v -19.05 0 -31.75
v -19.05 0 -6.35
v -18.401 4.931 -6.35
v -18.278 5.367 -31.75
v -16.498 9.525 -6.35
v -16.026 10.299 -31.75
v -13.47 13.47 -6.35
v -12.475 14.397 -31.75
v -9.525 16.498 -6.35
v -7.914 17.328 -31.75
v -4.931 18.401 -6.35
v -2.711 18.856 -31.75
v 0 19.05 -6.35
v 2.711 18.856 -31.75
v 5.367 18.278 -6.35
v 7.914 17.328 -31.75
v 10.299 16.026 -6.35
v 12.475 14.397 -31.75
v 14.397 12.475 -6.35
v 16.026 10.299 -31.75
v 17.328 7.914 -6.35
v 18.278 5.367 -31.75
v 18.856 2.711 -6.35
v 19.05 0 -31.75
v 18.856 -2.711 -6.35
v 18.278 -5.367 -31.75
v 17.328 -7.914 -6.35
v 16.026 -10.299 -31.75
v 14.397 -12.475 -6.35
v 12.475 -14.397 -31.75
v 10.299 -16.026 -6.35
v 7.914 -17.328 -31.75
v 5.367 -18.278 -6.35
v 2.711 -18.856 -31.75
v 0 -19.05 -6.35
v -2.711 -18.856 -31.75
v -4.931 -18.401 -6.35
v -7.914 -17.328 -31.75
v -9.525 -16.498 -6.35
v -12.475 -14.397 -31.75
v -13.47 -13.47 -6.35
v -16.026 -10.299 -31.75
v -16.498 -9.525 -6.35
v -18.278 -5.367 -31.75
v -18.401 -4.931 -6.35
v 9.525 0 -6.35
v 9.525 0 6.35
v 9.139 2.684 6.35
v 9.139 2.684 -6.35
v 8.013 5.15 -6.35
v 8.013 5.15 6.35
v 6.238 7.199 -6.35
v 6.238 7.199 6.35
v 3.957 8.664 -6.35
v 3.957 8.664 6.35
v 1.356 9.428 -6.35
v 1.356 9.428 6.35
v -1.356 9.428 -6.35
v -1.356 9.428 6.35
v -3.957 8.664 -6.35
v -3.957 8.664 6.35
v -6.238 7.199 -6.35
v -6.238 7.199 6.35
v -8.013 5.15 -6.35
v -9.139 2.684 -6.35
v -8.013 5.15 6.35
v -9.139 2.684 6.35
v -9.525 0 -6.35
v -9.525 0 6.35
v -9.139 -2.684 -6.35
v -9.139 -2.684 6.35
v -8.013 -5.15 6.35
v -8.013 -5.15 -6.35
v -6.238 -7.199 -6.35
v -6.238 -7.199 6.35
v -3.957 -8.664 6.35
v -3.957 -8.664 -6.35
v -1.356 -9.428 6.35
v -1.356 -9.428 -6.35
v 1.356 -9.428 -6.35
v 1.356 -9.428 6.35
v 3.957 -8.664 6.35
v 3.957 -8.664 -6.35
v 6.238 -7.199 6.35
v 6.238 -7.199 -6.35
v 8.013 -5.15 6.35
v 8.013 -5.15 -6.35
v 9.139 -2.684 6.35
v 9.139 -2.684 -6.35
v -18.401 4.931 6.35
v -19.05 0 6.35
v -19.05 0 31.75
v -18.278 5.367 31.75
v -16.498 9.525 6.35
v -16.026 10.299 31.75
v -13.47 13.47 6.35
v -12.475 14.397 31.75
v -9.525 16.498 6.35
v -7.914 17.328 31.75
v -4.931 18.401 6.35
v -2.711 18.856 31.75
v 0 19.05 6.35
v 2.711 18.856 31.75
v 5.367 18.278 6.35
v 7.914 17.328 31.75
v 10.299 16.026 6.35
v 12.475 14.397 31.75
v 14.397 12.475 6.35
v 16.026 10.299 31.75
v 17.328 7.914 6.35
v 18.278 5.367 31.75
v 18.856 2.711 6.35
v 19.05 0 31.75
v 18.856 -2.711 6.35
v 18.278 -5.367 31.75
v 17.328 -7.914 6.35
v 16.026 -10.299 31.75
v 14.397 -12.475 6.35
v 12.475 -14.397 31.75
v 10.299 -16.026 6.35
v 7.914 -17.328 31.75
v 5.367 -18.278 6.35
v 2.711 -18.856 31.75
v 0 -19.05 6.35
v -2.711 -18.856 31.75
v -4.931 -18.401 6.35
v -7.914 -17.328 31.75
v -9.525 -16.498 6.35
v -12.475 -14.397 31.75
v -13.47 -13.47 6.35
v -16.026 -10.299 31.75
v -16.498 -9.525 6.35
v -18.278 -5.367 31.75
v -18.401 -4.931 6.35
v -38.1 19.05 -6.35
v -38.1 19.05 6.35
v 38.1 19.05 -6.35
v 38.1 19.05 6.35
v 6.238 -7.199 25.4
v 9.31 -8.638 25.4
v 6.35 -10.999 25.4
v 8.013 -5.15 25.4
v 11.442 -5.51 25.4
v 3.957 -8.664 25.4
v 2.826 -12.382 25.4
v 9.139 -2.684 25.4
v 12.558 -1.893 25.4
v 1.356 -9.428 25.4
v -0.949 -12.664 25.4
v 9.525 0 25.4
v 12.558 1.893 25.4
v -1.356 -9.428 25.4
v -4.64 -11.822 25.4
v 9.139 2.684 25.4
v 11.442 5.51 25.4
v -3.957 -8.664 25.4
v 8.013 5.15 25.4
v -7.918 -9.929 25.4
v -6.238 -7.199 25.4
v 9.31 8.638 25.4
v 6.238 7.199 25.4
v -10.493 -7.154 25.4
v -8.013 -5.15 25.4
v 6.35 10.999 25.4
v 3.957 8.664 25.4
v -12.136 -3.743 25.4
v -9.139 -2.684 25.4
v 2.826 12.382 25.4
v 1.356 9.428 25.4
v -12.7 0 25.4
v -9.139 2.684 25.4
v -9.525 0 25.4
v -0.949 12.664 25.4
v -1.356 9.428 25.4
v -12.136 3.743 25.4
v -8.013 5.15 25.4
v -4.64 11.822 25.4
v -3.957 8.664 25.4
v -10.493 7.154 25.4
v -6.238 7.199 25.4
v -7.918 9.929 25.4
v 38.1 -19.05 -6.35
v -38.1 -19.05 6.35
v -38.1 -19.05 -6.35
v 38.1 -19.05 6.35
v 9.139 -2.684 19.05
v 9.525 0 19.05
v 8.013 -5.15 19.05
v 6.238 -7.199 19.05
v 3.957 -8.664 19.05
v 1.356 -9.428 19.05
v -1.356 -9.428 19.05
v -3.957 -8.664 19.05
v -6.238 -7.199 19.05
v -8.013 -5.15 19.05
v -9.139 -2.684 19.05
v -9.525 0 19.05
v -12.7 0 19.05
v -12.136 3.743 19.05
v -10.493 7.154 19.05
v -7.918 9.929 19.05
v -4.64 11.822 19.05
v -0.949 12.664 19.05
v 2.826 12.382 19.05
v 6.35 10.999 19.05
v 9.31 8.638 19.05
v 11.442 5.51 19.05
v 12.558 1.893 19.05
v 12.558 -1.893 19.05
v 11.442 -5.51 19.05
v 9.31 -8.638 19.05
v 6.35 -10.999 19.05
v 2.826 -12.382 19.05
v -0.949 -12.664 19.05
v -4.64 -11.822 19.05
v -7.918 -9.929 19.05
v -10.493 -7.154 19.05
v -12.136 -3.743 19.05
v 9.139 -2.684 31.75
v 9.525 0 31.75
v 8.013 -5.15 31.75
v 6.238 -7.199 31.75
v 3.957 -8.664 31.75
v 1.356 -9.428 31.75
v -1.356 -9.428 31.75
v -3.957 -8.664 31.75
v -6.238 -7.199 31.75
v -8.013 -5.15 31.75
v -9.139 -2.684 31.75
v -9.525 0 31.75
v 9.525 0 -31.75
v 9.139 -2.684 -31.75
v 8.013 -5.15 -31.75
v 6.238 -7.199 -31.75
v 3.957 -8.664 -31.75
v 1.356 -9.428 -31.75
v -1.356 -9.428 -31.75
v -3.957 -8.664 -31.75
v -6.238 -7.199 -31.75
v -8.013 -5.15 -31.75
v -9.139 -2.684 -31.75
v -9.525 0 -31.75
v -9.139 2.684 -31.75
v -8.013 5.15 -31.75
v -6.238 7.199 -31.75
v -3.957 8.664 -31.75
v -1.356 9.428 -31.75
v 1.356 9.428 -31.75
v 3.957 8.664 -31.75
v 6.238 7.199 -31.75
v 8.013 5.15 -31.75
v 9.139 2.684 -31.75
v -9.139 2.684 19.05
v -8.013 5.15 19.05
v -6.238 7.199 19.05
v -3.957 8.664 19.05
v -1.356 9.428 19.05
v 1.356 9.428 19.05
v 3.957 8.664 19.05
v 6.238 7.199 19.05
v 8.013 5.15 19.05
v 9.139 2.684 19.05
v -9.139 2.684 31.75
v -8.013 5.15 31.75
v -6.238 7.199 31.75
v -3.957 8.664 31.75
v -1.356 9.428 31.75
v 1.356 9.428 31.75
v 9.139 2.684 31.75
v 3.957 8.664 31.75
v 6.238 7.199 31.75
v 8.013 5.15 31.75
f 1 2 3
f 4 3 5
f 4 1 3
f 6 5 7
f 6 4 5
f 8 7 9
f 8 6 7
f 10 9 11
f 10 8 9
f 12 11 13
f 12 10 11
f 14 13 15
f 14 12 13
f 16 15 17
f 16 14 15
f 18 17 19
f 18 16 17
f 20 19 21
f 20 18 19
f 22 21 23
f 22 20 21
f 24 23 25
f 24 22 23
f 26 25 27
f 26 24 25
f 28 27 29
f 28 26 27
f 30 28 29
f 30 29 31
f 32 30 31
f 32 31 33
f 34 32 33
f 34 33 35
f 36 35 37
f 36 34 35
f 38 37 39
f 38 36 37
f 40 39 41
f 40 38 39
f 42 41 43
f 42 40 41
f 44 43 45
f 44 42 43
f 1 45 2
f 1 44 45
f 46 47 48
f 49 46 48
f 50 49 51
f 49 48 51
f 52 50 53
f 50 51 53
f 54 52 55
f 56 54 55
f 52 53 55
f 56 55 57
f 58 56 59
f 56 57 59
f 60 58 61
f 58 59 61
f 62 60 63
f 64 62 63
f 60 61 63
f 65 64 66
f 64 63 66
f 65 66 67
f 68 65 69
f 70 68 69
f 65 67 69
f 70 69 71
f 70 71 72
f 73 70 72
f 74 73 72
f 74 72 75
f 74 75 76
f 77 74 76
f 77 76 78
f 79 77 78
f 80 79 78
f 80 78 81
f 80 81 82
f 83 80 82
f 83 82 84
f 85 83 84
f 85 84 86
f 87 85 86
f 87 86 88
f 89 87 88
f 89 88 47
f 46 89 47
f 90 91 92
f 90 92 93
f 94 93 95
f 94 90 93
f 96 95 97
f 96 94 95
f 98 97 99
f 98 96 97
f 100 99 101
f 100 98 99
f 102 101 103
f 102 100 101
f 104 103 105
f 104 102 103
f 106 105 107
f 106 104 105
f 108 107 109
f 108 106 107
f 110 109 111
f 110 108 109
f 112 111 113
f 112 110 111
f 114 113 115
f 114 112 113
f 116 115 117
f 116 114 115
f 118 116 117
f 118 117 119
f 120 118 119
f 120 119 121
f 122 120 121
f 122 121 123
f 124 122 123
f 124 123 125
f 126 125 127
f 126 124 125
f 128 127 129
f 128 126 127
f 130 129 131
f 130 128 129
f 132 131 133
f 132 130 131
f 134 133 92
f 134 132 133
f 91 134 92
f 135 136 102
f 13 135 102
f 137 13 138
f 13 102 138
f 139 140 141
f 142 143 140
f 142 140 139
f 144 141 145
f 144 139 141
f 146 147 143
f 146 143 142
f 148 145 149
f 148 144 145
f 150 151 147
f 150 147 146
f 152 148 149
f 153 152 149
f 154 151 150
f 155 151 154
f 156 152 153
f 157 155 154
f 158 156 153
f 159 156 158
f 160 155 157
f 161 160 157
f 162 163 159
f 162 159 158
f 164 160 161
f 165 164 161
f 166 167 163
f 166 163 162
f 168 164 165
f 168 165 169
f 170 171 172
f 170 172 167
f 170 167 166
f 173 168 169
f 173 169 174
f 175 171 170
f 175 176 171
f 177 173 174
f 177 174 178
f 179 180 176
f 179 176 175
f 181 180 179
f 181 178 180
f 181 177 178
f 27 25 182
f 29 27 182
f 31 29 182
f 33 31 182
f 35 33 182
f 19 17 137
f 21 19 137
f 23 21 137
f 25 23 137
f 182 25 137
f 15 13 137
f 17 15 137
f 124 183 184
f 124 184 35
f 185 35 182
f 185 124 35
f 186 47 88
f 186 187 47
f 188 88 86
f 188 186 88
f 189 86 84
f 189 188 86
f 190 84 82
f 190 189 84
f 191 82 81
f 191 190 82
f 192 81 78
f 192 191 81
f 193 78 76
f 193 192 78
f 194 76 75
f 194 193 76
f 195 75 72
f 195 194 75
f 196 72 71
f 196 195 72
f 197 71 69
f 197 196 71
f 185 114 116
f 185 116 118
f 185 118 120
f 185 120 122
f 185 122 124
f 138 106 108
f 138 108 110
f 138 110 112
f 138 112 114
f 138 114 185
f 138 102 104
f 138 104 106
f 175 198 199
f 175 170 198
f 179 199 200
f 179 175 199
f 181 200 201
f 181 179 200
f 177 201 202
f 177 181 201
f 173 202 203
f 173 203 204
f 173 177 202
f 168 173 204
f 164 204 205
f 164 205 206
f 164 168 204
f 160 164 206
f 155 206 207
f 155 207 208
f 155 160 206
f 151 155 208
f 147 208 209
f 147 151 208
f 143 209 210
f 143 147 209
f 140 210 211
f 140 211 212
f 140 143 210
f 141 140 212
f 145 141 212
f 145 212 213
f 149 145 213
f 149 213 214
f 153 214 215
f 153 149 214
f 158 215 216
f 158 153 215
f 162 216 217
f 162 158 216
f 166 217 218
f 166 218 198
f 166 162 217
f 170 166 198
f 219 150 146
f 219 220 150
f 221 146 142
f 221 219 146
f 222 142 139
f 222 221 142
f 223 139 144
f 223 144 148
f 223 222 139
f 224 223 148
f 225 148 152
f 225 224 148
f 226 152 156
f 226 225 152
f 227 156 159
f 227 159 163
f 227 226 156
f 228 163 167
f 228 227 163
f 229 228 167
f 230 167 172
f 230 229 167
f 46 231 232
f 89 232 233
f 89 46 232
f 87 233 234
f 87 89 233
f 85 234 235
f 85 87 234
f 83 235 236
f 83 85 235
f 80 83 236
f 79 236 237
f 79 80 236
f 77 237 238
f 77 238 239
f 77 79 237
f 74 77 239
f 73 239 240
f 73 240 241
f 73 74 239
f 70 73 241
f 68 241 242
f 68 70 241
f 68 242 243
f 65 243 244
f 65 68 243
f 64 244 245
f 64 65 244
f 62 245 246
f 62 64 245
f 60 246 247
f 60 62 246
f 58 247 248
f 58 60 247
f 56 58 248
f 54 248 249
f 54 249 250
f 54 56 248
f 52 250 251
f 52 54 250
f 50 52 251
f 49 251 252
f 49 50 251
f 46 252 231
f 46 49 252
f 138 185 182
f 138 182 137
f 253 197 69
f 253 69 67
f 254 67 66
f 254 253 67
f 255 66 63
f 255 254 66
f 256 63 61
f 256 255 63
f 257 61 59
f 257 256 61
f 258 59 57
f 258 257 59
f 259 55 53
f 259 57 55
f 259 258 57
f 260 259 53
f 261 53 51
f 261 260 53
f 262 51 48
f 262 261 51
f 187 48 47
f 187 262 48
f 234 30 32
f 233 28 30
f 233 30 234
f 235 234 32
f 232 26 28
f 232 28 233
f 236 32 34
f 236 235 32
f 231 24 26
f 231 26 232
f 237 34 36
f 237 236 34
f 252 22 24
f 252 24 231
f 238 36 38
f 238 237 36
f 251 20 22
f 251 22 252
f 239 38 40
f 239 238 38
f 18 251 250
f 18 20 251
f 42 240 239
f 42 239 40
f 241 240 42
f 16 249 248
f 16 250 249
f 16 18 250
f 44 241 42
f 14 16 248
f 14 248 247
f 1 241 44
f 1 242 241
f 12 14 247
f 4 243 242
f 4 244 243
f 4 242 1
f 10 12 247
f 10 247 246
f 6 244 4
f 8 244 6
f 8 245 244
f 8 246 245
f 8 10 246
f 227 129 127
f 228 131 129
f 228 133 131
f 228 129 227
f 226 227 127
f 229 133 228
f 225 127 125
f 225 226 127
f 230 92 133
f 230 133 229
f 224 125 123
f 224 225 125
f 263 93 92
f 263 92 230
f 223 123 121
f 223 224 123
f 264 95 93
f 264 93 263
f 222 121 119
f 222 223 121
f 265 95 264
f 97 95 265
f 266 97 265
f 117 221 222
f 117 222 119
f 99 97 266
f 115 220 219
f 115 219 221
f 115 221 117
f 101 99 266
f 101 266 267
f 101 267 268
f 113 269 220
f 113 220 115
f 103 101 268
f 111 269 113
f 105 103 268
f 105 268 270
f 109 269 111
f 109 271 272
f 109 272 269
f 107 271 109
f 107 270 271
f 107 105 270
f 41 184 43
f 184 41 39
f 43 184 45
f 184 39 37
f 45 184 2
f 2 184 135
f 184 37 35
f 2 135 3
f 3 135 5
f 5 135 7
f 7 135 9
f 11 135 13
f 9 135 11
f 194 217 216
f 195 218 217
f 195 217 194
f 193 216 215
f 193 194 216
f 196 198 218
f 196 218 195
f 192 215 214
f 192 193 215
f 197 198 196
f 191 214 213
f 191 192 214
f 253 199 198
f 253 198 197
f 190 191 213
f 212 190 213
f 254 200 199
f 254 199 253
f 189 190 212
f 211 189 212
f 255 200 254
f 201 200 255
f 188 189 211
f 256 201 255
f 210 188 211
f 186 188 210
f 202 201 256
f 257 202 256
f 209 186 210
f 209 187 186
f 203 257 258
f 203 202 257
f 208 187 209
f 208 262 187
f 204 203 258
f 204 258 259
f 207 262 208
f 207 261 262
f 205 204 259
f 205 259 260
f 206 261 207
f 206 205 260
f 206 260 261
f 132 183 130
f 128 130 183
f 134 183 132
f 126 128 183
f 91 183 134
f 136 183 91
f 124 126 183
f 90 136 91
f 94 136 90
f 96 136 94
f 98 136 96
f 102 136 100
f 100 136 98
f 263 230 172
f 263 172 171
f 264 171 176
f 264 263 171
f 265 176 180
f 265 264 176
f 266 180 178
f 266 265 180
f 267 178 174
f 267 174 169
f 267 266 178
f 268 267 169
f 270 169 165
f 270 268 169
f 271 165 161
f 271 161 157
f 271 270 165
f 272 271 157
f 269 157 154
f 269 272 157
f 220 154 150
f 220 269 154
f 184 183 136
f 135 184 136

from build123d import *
from build123d import SkipClean  # not in build123d's __all__

# Parameters (mm, degrees)
F2_W     = 76.2
F2_H     = 38.1
F3_DEPTH = 6.35
F4_R     = 9.525
F5_DEPTH = 63.501


with BuildPart() as f1:
    # F0 (on Front) → F1 (revolve)
    with BuildSketch(Plane.XZ):
        Polygon((-9.525, 25.4), (-9.525, 31.75), (-19.05, 31.75), (-19.05, -31.75), (-9.525, -31.75), (-9.525, 19.05), (-12.7, 19.05), (-12.7, 25.4), align=None)
    revolve(axis=Axis((0, 0, 1.6377754509), (0, 0, -1)))

    # F2 (on Top) → F3 (join, symmetric)
    with BuildSketch(Plane.XY):
        Rectangle(F2_W, F2_H)
    extrude(amount=F3_DEPTH, both=True)

    # F4 (on face) → F5 (cut, through all)
    with BuildSketch(Plane.XY.offset(31.75)):
        Circle(F4_R)
    with SkipClean():  # cleaning this boolean's faces spoils the solid; the shape is the same uncleaned
        extrude(amount=-F5_DEPTH, mode=Mode.SUBTRACT)


solid = f1.part
